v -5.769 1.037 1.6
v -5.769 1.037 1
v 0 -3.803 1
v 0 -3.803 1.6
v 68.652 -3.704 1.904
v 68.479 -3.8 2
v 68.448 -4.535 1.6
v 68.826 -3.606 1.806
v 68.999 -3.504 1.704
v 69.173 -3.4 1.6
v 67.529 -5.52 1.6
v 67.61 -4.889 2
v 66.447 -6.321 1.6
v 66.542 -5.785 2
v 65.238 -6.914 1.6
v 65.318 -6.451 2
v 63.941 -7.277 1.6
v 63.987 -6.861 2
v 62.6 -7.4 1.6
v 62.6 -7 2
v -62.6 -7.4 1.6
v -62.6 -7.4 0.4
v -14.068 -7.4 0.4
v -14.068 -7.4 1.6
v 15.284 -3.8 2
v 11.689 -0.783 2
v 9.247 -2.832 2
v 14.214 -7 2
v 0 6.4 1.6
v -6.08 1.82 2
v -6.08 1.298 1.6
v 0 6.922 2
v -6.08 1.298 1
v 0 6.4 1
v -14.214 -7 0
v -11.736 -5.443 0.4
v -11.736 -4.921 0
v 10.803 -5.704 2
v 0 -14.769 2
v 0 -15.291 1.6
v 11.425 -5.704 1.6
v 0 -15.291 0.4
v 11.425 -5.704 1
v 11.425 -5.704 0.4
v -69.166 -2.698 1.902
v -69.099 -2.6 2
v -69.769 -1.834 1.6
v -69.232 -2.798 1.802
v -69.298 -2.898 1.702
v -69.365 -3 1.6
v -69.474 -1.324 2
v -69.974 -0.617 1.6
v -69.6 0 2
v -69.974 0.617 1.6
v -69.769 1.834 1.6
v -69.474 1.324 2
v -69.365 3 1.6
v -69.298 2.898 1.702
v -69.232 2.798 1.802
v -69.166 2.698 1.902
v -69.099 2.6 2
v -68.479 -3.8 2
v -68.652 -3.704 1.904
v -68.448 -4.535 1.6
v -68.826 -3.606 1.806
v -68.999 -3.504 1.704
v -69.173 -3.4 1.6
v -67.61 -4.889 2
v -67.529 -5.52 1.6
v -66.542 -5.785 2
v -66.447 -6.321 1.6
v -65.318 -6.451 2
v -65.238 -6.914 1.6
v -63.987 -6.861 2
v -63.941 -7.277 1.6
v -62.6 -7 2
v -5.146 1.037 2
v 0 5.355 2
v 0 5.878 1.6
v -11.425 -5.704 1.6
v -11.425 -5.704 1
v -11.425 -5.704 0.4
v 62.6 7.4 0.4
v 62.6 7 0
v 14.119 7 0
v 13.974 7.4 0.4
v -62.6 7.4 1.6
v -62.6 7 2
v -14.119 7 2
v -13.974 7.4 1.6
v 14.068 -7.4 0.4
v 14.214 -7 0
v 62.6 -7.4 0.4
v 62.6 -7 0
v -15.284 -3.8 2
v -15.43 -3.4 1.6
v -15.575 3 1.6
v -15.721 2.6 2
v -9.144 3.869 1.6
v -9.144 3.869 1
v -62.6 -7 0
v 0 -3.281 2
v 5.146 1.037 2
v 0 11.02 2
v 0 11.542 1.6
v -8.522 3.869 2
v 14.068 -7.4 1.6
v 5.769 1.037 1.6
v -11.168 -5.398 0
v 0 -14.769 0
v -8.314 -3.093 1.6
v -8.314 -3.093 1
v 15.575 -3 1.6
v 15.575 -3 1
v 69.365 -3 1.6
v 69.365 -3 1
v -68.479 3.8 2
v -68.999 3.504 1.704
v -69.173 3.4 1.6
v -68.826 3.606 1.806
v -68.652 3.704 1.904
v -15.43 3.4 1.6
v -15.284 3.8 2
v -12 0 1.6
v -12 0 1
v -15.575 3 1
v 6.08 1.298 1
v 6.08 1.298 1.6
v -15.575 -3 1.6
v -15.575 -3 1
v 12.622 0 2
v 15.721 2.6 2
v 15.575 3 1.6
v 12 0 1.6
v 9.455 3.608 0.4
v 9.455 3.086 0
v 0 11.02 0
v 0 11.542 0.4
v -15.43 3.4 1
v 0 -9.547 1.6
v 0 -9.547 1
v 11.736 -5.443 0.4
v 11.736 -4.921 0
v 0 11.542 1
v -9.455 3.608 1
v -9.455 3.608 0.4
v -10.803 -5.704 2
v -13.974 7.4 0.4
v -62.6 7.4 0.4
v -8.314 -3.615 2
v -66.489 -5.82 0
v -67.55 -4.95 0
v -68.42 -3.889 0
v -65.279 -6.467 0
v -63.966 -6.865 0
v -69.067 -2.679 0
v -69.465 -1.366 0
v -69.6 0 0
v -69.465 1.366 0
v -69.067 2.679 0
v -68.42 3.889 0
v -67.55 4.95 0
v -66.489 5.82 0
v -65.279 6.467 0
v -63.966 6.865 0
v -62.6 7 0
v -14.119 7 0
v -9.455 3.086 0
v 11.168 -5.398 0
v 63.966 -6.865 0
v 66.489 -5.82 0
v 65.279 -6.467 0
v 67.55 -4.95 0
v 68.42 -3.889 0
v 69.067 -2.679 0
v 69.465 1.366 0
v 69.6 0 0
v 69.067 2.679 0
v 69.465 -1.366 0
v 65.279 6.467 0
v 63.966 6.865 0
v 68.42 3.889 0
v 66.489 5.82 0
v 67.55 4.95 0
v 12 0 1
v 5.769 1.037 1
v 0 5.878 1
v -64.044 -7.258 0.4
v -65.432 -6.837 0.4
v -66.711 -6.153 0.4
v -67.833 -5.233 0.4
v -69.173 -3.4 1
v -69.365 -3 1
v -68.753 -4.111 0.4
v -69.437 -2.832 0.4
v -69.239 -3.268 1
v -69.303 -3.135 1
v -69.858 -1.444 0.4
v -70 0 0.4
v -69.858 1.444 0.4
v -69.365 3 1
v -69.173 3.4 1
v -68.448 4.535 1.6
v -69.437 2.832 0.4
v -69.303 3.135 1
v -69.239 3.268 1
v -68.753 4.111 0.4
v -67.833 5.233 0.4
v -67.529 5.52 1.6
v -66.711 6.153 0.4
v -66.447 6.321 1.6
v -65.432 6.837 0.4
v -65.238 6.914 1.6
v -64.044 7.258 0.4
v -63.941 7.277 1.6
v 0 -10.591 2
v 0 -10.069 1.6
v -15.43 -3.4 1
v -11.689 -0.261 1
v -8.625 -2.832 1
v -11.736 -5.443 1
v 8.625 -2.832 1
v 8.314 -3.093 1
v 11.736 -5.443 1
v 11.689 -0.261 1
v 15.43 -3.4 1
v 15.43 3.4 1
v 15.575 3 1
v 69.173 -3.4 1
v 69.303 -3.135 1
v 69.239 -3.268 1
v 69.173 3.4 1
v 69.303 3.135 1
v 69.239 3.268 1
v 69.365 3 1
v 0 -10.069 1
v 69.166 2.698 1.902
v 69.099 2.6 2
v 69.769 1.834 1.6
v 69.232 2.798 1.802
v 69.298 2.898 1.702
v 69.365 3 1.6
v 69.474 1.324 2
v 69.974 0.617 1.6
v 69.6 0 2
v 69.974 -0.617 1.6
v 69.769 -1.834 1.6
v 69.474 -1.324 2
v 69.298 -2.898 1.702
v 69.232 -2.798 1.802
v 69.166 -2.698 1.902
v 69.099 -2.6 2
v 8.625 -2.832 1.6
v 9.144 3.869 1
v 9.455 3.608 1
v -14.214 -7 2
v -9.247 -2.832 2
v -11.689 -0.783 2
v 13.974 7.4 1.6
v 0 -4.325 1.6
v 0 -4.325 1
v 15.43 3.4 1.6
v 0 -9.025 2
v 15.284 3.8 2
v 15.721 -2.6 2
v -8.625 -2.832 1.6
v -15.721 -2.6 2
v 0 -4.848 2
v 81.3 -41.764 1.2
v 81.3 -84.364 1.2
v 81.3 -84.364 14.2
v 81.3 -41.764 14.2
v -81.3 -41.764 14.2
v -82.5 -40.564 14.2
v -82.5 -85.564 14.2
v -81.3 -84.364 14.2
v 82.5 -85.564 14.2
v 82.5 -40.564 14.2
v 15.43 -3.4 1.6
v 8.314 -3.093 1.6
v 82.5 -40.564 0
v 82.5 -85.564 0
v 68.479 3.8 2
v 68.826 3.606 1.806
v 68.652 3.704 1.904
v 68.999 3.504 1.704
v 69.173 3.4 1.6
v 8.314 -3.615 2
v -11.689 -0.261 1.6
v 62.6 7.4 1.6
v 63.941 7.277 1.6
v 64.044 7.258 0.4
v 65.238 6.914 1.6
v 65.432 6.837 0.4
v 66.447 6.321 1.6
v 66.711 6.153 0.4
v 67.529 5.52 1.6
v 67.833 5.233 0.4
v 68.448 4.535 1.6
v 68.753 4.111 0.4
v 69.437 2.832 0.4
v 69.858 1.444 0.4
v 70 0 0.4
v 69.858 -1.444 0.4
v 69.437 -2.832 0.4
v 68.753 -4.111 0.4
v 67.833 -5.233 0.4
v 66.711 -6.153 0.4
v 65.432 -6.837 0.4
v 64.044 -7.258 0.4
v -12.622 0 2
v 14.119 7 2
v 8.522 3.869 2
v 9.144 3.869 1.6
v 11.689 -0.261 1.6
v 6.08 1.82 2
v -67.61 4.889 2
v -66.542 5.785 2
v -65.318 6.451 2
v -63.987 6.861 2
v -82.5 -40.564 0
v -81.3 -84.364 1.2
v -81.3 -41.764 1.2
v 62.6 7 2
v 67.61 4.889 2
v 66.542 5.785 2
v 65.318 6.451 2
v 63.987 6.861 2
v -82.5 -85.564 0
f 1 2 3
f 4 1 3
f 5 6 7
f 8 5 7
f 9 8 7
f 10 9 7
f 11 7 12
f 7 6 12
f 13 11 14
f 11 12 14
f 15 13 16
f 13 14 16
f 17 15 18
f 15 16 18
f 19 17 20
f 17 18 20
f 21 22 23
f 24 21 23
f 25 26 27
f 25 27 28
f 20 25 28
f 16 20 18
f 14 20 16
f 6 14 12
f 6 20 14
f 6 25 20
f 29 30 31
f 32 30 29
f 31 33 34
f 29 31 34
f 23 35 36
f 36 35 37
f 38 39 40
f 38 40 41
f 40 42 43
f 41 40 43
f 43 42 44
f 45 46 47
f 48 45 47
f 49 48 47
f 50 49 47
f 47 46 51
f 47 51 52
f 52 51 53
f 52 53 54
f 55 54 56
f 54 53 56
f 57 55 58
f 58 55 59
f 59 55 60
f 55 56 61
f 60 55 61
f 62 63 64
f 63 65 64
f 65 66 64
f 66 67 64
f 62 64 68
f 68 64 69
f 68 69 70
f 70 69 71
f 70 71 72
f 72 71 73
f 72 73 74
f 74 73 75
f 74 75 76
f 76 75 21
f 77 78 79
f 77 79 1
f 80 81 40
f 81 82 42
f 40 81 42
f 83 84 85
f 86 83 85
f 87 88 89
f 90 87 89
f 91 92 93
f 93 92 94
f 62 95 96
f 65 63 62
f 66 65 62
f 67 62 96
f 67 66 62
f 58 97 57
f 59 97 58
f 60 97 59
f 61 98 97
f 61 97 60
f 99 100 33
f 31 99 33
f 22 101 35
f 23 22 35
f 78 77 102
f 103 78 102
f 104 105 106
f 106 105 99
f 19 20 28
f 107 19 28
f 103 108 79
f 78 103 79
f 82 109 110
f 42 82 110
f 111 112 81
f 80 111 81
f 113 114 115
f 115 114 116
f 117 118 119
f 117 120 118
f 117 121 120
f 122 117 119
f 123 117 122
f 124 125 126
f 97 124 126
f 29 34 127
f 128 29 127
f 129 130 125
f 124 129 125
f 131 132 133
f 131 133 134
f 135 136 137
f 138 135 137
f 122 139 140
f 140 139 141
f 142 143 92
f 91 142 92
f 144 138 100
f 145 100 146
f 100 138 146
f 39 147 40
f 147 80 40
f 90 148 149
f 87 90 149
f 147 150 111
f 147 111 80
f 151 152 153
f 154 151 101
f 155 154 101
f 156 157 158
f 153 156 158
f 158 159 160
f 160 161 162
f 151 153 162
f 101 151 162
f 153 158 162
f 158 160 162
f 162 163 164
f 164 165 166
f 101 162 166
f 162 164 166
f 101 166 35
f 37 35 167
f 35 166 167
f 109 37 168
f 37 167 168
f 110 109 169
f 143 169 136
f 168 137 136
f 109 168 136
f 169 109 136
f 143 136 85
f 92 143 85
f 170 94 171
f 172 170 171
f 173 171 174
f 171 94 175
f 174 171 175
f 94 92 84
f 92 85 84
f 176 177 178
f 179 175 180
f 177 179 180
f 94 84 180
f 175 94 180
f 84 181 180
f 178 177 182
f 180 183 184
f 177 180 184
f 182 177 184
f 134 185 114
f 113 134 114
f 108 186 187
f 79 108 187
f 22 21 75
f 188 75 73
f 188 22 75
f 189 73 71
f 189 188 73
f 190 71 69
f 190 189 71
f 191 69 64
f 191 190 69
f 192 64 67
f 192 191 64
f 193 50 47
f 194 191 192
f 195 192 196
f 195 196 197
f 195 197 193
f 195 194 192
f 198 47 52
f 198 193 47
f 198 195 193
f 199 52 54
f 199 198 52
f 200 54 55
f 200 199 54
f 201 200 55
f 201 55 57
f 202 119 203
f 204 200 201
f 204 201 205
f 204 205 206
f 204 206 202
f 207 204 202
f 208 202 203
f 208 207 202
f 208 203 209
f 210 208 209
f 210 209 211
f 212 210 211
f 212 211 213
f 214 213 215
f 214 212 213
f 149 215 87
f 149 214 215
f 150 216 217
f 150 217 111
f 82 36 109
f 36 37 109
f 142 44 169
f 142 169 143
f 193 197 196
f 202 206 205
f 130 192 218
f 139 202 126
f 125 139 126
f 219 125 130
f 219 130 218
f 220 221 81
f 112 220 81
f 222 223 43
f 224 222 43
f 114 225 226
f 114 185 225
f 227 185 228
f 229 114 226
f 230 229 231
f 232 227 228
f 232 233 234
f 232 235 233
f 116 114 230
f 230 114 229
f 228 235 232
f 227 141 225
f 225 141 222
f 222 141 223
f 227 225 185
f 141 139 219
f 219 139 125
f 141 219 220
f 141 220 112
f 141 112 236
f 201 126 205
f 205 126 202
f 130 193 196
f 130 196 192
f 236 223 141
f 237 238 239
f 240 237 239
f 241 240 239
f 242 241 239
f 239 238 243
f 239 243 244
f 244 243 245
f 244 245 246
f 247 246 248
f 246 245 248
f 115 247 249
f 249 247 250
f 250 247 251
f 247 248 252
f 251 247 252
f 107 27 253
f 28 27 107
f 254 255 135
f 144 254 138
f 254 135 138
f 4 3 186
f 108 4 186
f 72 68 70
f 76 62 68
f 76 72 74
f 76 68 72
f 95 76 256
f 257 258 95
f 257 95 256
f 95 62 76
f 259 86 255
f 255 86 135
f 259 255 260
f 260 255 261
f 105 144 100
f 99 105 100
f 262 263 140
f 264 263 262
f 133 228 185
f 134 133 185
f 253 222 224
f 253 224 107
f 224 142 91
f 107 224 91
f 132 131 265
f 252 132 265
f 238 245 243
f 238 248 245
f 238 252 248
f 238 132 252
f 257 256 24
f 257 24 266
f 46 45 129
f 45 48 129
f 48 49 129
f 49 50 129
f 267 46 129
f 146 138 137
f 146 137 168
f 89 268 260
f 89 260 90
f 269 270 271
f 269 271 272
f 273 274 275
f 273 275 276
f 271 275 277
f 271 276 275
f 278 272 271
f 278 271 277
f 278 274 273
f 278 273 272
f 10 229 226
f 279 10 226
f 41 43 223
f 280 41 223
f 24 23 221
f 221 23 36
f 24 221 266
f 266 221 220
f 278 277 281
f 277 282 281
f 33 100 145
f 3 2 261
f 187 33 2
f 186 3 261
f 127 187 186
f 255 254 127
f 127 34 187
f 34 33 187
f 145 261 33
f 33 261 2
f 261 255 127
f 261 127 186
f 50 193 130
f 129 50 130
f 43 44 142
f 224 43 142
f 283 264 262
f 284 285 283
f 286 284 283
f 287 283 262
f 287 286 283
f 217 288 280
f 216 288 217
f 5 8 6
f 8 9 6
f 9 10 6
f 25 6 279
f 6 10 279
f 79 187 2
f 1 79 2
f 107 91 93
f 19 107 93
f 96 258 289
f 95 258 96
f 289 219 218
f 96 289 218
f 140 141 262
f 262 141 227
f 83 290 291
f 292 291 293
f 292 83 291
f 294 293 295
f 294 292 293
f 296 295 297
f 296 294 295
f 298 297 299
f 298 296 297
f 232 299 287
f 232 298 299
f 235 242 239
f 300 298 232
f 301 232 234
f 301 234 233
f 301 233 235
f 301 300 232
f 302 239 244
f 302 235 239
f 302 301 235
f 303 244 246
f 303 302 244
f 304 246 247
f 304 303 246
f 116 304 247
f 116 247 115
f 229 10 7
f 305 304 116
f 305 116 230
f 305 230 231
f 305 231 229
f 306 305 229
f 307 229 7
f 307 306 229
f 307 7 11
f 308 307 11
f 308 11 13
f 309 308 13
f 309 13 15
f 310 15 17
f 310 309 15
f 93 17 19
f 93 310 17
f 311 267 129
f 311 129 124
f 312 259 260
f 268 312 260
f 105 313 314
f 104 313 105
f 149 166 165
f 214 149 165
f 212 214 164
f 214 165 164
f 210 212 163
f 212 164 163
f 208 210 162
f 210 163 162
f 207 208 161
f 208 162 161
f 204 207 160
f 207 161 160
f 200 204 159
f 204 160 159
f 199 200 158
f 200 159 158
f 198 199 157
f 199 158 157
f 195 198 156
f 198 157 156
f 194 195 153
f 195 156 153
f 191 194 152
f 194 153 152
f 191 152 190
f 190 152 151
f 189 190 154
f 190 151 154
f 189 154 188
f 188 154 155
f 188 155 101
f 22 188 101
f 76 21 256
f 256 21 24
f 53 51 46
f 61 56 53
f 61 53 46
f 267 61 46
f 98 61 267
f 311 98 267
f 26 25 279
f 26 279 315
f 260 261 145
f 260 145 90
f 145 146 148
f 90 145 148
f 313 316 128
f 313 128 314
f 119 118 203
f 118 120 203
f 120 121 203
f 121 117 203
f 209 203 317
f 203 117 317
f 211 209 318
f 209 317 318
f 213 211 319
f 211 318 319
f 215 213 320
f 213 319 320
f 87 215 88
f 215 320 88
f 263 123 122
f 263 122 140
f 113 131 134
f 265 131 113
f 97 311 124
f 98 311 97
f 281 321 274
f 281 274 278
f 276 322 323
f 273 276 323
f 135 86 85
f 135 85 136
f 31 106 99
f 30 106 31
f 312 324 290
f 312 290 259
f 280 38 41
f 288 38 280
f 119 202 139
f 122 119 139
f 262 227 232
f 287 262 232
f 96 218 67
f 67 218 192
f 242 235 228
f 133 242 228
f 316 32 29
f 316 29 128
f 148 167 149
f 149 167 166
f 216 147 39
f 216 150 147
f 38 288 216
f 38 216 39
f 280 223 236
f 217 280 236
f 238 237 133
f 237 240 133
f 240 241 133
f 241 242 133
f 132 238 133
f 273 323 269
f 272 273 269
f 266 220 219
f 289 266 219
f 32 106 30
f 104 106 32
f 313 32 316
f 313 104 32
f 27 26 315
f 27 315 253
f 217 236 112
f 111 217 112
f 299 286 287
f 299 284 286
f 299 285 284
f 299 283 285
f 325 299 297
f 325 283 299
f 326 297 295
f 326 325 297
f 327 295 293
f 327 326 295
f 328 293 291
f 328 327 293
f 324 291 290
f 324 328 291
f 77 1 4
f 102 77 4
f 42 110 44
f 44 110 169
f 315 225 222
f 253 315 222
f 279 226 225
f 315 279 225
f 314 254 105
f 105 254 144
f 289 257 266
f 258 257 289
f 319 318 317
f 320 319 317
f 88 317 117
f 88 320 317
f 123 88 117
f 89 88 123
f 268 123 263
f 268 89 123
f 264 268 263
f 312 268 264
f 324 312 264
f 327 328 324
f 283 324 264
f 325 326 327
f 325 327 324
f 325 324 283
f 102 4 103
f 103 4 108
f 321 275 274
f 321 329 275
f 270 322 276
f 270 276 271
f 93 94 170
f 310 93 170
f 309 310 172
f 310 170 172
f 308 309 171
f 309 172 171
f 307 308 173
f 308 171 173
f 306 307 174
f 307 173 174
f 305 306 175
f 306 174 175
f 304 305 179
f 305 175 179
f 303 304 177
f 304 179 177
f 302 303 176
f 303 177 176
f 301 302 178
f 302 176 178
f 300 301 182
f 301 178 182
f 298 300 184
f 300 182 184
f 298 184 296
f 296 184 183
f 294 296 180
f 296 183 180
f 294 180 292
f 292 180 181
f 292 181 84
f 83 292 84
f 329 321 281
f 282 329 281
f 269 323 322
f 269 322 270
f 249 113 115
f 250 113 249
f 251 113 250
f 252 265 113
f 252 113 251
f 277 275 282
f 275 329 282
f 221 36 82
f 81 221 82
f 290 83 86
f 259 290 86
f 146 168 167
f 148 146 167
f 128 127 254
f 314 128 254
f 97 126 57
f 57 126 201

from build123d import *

# Parameters (mm, degrees)
F1_DEPTH  = 2
F3_DEPTH  = 2
F5_DEPTH  = 2
F7_DEPTH  = 2
F9_DEPTH  = 1
F12_DEPTH = 2
F13_SIZE  = 0.4
F14_W     = 165
F14_H     = 45
F15_DEPTH = 1.2
F16_W     = 165
F16_H     = 45
F16_W_2   = 162.6
F16_H_2   = 42.6
F17_DEPTH = 13


with BuildPart() as f1:
    # F0 (on Top) → F1 (new body)
    with BuildSketch(Plane.XY):
        Polygon((15.575261, 3), (12, 0), (15.575261, -3), (70, -3), (70, 0), (70, 3), align=None)
        Polygon((-15.575261, -3), (-12, 0), (-15.575261, 3), (-70, 3), (-70, 0), (-70, -3), align=None)
    extrude(amount=F1_DEPTH)


with BuildPart() as f3:
    # F2 (on Top) → F3 (new body)
    with BuildSketch(Plane.XY):
        Polygon((-15.429673, 3.4), (0, -9.547033), (15.429673, 3.4), (70, 3.4), (70, 7.4), (13.973792, 7.4), (0, -4.325404), (-13.973792, 7.4), (-70, 7.4), (-70, 3.4), align=None)
    extrude(amount=F3_DEPTH)


with BuildPart() as f5:
    # F4 (on Top) → F5 (new body)
    with BuildSketch(Plane.XY):
        Polygon((6.079716, 1.298247), (9.143894, 3.869397), (0, 11.542036), (-9.143894, 3.869397), (-6.079716, 1.298247), (0, 6.399735), align=None)
        Polygon((15.429673, -3.4), (11.688855, -0.261081), (8.624677, -2.832232), (14.068332, -7.4), (70, -7.4), (70, -3.4), align=None)
        Polygon((-70, -7.4), (-14.068332, -7.4), (-8.624677, -2.832232), (-11.688855, -0.261081), (-15.429673, -3.4), (-70, -3.4), align=None)
    extrude(amount=F5_DEPTH)


with BuildPart() as f7:
    # F6 (on Top) → F7 (new body)
    with BuildSketch(Plane.XY):
        Polygon((-11.42498, -5.704128), (0, -15.290825), (11.42498, -5.704128), (8.313533, -3.093313), (0, -10.069196), (-8.313533, -3.093313), align=None)
        Polygon((-5.768571, 1.037166), (0, -3.803241), (5.768571, 1.037166), (0, 5.877572), align=None)
    extrude(amount=F7_DEPTH)


with BuildPart() as f9:
    # F8 (on Top) → F9 (new body)
    with BuildSketch(Plane.XY):
        Polygon((9.455039, 3.608316), (0, 11.542036), (-9.455039, 3.608316), (-13.973792, 7.4), (-70, 7.4), (-70, -7.4), (-14.068332, -7.4), (-11.736125, -5.443046), (0, -15.290825), (11.736125, -5.443046), (14.068332, -7.4), (70, -7.4), (70, 7.4), (13.973792, 7.4), align=None)
    extrude(amount=F9_DEPTH)


with BuildPart() as f1_1:
    add(f1.part)

    # F10: union F3, F5, F7, F9
    add(f3.part)
    add(f5.part)
    add(f7.part)
    add(f9.part)

    # F11 (on Top) → F12 (cut, through all)
    with BuildSketch(Plane.XY):
        with BuildLine():
            ThreePointArc((62.6, 7.4), (70, 0), (62.6, -7.4))
            Line((62.6, -7.4), (112.117278, -7.4))
            Line((112.117278, -7.4), (112.117278, 7.4))
            Line((112.117278, 7.4), (62.6, 7.4))
        make_face()
        with BuildLine():
            Line((-112.117278, -7.4), (-62.6, -7.4))
            ThreePointArc((-62.6, -7.4), (-70, 0), (-62.6, 7.4))
            Line((-62.6, 7.4), (-112.117278, 7.4))
            Line((-112.117278, 7.4), (-112.117278, -7.4))
        make_face()
    extrude(amount=F12_DEPTH, mode=Mode.SUBTRACT)

    # F13
    f13_edges = [f1_1.edges().sort_by_distance(p)[0] for p in [
        (-42.301172, 3.4, 2),
        (-66.447077, 6.321392, 2),
        (-38.286896, 7.4, 2),
        (-6.986896, 1.537298, 2),
        (6.986896, 1.537298, 2),
        (38.286896, 7.4, 2),
        (66.447077, 6.321392, 2),
        (42.301172, 3.4, 2),
        (7.714836, -3.073516, 2),
        (-7.714836, -3.073516, 2),
        (-42.469937, -3, 2),
        (-13.78763, -1.5, 2),
        (-13.78763, 1.5, 2),
        (-42.469937, 3, 2),
        (-70, 0, 2),
        (-13.559264, -1.830541, 2),
        (-10.156766, -1.546657, 2),
        (-11.346504, -5.116116, 2),
        (-38.334166, -7.4, 2),
        (-66.447077, -6.321392, 2),
        (-42.301172, -3.4, 2),
        (3.039858, 3.848991, 2),
        (7.611805, 2.583822, 2),
        (4.571947, 7.705717, 2),
        (-4.571947, 7.705717, 2),
        (-7.611805, 2.583822, 2),
        (-3.039858, 3.848991, 2),
        (-2.884286, -1.383037, 2),
        (2.884286, -1.383037, 2),
        (2.884286, 3.457369, 2),
        (-2.884286, 3.457369, 2),
        (-5.71249, -10.497476, 2),
        (5.71249, -10.497476, 2),
        (9.869257, -4.398721, 2),
        (4.156766, -6.581254, 2),
        (-4.156766, -6.581254, 2),
        (-9.869257, -4.398721, 2),
        (42.301172, -3.4, 2),
        (66.447077, -6.321392, 2),
        (38.334166, -7.4, 2),
        (11.346504, -5.116116, 2),
        (10.156766, -1.546657, 2),
        (13.559264, -1.830541, 2),
        (42.469937, 3, 2),
        (13.78763, 1.5, 2),
        (13.78763, -1.5, 2),
        (42.469937, -3, 2),
        (70, 0, 2),
        (38.334166, -7.4, 0),
        (70, 0, 0),
        (38.286896, 7.4, 0),
        (11.714415, 5.504158, 0),
        (4.727519, 7.575176, 0),
        (-4.727519, 7.575176, 0),
        (-11.714415, 5.504158, 0),
        (-38.286896, 7.4, 0),
        (-70, 0, 0),
        (-38.334166, -7.4, 0),
        (-12.902228, -6.421523, 0),
        (-5.868063, -10.366936, 0),
        (5.868063, -10.366936, 0),
        (12.902228, -6.421523, 0),
    ]]
    chamfer(f13_edges, length=F13_SIZE)


with BuildPart() as f15:
    # F14 (on Top) → F15 (new body)
    with BuildSketch(Plane.XY):
        with Locations((0, -63.063599)):
            Rectangle(F14_W, F14_H)
    extrude(amount=F15_DEPTH)

    # F16 (on face) → F17 (join)
    with BuildSketch(Plane.XY.offset(1.2)):
        with Locations((0, -63.063599)):
            Rectangle(F16_W, F16_H)
        with Locations((0, -63.063599)):
            Rectangle(F16_W_2, F16_H_2, mode=Mode.SUBTRACT)
    extrude(amount=F17_DEPTH)


solid = Compound([f1_1.part, f15.part])
